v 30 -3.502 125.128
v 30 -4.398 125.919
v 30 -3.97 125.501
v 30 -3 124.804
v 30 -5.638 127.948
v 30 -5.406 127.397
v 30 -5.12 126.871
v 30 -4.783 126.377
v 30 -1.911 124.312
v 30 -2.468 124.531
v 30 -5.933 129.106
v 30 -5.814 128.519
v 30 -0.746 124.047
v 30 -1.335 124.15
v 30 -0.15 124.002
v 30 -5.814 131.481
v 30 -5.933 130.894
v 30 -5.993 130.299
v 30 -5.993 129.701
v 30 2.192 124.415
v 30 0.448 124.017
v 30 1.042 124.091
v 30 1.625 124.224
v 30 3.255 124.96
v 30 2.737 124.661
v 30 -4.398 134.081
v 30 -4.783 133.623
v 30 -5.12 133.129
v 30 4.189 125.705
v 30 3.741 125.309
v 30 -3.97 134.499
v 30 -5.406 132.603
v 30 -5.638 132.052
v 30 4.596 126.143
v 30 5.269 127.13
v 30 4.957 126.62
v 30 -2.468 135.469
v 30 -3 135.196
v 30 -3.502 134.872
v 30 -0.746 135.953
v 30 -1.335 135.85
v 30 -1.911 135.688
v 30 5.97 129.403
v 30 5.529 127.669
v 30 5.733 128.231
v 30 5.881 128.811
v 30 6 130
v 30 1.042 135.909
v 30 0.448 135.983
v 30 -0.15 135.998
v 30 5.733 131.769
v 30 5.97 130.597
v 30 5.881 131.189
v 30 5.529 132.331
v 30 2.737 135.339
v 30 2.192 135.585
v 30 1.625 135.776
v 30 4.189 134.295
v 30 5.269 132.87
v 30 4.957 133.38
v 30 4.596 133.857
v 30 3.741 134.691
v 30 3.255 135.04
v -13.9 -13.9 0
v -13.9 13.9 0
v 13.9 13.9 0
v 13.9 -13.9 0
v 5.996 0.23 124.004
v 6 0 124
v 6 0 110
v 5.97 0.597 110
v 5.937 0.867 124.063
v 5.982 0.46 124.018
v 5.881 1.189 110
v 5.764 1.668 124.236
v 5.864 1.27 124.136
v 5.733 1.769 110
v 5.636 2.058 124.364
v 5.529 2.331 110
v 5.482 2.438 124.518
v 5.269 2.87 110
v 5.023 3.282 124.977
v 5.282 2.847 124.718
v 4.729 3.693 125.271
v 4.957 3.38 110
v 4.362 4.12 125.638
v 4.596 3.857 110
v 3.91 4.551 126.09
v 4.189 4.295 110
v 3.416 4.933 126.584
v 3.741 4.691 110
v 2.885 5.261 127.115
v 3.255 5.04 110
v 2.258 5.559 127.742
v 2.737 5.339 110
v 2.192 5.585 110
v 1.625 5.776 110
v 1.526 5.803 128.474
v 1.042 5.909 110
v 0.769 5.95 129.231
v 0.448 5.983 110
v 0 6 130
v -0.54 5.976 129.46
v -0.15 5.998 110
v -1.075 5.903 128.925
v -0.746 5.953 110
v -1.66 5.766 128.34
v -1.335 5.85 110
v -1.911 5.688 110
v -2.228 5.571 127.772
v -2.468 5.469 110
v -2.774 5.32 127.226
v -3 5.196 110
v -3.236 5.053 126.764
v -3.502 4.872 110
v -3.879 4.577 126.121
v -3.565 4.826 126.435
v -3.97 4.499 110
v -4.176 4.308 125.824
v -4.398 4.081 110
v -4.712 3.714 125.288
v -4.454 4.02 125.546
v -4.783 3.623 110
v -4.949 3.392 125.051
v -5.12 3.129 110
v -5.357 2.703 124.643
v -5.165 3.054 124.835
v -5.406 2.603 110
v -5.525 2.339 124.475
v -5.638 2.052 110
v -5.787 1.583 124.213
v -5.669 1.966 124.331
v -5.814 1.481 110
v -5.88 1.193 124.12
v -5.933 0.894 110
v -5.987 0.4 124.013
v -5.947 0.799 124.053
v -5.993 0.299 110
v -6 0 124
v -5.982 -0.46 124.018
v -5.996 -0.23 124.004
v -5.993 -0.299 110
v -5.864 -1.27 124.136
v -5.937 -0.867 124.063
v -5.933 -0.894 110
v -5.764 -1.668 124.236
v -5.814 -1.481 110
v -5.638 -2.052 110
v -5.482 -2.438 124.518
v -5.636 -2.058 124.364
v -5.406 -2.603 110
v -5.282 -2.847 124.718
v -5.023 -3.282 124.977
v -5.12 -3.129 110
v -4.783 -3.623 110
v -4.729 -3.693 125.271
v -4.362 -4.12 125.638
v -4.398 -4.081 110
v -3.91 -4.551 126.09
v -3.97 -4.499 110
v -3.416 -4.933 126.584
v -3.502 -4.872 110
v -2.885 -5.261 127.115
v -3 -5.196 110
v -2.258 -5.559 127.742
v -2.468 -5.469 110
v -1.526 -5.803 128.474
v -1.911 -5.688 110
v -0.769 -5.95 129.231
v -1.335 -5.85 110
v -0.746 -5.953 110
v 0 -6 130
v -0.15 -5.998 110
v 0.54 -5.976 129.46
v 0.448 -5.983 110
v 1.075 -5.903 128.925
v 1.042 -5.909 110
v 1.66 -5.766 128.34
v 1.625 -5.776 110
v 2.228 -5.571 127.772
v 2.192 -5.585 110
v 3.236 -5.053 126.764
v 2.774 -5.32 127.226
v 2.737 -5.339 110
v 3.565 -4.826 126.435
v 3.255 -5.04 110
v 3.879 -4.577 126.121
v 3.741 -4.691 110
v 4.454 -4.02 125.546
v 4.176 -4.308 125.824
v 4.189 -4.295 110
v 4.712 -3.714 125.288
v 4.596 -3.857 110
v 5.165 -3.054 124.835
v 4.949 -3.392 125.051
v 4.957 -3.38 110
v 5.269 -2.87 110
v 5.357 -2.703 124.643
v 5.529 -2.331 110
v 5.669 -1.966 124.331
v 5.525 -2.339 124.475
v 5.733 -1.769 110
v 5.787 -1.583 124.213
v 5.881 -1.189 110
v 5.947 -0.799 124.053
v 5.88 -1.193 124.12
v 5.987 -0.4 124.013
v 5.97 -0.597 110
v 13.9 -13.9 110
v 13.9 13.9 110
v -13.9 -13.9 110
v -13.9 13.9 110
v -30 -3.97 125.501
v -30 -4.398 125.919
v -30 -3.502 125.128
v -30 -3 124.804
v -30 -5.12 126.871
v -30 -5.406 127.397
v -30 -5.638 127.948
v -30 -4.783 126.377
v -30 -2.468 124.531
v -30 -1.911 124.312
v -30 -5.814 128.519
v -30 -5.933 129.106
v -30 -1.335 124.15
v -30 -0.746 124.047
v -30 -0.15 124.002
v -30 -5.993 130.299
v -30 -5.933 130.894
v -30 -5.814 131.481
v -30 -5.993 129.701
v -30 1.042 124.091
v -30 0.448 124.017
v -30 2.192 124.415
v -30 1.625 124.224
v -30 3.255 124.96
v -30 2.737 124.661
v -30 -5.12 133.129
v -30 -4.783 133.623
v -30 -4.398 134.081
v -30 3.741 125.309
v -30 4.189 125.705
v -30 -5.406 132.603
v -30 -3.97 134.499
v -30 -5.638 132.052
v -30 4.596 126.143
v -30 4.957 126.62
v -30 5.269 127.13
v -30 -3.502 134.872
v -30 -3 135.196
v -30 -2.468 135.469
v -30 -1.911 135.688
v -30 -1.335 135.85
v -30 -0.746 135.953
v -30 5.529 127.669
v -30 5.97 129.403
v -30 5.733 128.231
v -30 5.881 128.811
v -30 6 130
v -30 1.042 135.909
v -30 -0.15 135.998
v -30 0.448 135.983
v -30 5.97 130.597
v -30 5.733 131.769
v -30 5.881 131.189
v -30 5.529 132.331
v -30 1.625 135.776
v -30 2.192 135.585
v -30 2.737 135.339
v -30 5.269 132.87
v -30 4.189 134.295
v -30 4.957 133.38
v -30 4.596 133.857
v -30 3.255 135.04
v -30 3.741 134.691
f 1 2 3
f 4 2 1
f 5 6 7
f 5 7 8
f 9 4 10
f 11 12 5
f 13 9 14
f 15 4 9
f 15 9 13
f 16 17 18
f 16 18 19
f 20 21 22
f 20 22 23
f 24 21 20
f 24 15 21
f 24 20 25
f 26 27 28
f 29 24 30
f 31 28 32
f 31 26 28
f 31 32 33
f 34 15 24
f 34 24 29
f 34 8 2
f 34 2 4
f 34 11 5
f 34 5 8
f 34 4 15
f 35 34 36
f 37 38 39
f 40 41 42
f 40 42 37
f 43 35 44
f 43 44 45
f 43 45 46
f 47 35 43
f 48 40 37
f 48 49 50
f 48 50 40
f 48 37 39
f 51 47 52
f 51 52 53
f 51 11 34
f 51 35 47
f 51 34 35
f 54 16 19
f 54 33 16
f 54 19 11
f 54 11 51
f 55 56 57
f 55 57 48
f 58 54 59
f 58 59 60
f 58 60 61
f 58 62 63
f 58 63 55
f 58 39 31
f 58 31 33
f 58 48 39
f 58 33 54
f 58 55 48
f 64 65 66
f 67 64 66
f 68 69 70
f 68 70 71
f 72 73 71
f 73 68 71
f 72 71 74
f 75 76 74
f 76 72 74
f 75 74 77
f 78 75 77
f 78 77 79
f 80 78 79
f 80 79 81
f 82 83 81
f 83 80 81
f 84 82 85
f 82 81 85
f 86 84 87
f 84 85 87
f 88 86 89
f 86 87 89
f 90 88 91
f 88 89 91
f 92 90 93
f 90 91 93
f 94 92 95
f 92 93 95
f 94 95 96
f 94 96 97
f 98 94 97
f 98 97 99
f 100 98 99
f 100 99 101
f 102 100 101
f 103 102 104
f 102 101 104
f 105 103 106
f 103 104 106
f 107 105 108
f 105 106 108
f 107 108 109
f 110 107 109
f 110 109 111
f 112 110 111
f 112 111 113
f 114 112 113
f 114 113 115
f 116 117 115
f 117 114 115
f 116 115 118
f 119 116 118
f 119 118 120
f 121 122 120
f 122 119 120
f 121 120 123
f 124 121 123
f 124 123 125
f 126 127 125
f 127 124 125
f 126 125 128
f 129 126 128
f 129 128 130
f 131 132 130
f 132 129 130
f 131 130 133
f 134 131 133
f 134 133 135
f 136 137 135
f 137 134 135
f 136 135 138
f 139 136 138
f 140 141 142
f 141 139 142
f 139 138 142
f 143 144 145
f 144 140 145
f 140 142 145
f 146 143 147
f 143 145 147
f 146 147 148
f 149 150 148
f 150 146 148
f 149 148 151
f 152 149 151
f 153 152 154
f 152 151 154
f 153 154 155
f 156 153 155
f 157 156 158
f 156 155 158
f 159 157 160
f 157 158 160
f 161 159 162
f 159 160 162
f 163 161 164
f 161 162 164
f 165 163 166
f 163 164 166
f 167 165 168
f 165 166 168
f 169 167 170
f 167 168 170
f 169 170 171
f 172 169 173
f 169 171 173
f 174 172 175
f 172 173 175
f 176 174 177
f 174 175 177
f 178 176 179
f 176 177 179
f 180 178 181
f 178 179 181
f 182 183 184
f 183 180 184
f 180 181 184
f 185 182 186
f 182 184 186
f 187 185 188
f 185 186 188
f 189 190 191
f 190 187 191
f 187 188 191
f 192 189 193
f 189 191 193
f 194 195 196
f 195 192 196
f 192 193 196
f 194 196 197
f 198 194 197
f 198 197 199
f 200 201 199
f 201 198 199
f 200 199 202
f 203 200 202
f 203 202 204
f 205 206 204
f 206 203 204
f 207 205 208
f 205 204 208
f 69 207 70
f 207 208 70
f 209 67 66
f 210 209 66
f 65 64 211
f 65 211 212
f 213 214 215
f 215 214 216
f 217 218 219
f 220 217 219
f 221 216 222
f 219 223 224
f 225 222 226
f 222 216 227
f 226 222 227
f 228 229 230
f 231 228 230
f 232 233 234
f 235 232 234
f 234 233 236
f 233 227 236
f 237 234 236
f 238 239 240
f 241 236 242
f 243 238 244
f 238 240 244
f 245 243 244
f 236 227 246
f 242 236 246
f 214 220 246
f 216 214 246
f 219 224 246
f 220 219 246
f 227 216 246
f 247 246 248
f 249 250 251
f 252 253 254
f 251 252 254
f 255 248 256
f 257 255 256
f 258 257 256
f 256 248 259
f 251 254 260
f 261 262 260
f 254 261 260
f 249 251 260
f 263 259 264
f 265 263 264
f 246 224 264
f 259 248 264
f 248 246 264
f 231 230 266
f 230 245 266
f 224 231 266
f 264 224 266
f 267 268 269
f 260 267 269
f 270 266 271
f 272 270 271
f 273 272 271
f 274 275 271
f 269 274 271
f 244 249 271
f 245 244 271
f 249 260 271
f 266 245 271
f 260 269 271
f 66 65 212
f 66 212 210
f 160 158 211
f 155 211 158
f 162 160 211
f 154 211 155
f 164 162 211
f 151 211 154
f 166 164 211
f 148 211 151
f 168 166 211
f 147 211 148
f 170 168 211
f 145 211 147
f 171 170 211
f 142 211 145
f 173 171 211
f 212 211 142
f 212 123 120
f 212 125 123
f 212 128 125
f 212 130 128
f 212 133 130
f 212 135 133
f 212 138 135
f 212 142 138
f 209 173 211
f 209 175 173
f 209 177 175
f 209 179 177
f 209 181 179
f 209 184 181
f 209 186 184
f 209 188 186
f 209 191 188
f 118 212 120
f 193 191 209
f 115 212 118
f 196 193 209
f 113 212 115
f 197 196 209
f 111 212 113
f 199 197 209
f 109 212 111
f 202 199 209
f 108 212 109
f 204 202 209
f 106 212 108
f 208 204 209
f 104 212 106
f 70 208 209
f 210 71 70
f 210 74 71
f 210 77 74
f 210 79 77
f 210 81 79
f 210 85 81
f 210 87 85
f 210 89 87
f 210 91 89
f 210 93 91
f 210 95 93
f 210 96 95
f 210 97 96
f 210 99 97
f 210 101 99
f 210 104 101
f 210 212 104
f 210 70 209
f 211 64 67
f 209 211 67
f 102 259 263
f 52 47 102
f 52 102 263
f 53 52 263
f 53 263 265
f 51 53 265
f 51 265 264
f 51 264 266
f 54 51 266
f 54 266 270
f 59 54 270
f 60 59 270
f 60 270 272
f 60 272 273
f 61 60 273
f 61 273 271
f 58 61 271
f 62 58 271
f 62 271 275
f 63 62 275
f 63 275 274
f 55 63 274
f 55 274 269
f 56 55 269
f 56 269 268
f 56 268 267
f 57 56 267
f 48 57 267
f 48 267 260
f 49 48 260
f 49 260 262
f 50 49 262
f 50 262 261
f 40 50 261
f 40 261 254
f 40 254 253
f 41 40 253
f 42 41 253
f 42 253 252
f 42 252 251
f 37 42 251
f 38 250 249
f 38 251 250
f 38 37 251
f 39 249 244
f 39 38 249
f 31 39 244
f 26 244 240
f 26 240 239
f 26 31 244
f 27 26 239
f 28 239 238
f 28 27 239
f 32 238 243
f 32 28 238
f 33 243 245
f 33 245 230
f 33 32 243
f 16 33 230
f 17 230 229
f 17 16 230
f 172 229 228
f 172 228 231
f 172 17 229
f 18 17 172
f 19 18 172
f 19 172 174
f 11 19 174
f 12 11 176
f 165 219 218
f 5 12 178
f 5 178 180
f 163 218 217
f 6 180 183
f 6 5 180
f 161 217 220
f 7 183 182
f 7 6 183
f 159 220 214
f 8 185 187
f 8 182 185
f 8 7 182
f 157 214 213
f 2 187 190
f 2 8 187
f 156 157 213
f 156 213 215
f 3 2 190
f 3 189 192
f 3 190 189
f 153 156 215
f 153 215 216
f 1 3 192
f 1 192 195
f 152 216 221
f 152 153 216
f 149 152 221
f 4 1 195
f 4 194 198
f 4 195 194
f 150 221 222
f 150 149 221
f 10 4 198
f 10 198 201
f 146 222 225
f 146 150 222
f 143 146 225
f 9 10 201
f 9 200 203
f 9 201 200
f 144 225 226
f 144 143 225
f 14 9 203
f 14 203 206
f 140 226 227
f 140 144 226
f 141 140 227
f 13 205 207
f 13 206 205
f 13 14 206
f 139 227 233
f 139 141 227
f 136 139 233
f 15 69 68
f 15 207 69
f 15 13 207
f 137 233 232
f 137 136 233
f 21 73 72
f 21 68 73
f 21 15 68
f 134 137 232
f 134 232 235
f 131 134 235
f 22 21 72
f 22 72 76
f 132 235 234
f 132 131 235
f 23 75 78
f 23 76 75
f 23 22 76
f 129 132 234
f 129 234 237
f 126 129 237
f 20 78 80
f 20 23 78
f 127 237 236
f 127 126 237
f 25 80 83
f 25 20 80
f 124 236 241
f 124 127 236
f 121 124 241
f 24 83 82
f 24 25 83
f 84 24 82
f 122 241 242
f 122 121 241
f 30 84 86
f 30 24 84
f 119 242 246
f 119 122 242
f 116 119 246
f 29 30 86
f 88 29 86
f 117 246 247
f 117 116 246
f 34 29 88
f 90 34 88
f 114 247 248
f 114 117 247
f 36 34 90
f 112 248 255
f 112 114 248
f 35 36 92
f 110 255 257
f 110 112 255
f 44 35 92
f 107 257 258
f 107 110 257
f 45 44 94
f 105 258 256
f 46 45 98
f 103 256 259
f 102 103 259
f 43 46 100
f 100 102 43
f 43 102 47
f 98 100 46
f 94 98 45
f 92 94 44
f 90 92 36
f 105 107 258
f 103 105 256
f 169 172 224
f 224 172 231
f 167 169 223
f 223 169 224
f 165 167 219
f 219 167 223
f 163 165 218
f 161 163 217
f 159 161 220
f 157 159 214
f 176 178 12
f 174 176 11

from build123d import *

# Parameters (mm, degrees)
F0_W     = 27.8
F0_H     = 27.8
F1_DEPTH = 110
F2_R     = 6
F3_DEPTH = 20
F4_R     = 6
F5_DEPTH = 30


with BuildPart() as f1:
    # F0 (on Top) → F1 (new body)
    with BuildSketch(Plane.XY):
        Rectangle(F0_W, F0_H)
    extrude(amount=F1_DEPTH)

    # F2 (on face) → F3 (join)
    with BuildSketch(Plane.XY.offset(110)):
        Circle(F2_R)
    extrude(amount=F3_DEPTH)

    # F4 (on Right) → F5 (join, symmetric)
    with BuildSketch(Plane.YZ):
        with Locations((0, 130)):
            Circle(F4_R)
    extrude(amount=F5_DEPTH, both=True)


solid = f1.part
